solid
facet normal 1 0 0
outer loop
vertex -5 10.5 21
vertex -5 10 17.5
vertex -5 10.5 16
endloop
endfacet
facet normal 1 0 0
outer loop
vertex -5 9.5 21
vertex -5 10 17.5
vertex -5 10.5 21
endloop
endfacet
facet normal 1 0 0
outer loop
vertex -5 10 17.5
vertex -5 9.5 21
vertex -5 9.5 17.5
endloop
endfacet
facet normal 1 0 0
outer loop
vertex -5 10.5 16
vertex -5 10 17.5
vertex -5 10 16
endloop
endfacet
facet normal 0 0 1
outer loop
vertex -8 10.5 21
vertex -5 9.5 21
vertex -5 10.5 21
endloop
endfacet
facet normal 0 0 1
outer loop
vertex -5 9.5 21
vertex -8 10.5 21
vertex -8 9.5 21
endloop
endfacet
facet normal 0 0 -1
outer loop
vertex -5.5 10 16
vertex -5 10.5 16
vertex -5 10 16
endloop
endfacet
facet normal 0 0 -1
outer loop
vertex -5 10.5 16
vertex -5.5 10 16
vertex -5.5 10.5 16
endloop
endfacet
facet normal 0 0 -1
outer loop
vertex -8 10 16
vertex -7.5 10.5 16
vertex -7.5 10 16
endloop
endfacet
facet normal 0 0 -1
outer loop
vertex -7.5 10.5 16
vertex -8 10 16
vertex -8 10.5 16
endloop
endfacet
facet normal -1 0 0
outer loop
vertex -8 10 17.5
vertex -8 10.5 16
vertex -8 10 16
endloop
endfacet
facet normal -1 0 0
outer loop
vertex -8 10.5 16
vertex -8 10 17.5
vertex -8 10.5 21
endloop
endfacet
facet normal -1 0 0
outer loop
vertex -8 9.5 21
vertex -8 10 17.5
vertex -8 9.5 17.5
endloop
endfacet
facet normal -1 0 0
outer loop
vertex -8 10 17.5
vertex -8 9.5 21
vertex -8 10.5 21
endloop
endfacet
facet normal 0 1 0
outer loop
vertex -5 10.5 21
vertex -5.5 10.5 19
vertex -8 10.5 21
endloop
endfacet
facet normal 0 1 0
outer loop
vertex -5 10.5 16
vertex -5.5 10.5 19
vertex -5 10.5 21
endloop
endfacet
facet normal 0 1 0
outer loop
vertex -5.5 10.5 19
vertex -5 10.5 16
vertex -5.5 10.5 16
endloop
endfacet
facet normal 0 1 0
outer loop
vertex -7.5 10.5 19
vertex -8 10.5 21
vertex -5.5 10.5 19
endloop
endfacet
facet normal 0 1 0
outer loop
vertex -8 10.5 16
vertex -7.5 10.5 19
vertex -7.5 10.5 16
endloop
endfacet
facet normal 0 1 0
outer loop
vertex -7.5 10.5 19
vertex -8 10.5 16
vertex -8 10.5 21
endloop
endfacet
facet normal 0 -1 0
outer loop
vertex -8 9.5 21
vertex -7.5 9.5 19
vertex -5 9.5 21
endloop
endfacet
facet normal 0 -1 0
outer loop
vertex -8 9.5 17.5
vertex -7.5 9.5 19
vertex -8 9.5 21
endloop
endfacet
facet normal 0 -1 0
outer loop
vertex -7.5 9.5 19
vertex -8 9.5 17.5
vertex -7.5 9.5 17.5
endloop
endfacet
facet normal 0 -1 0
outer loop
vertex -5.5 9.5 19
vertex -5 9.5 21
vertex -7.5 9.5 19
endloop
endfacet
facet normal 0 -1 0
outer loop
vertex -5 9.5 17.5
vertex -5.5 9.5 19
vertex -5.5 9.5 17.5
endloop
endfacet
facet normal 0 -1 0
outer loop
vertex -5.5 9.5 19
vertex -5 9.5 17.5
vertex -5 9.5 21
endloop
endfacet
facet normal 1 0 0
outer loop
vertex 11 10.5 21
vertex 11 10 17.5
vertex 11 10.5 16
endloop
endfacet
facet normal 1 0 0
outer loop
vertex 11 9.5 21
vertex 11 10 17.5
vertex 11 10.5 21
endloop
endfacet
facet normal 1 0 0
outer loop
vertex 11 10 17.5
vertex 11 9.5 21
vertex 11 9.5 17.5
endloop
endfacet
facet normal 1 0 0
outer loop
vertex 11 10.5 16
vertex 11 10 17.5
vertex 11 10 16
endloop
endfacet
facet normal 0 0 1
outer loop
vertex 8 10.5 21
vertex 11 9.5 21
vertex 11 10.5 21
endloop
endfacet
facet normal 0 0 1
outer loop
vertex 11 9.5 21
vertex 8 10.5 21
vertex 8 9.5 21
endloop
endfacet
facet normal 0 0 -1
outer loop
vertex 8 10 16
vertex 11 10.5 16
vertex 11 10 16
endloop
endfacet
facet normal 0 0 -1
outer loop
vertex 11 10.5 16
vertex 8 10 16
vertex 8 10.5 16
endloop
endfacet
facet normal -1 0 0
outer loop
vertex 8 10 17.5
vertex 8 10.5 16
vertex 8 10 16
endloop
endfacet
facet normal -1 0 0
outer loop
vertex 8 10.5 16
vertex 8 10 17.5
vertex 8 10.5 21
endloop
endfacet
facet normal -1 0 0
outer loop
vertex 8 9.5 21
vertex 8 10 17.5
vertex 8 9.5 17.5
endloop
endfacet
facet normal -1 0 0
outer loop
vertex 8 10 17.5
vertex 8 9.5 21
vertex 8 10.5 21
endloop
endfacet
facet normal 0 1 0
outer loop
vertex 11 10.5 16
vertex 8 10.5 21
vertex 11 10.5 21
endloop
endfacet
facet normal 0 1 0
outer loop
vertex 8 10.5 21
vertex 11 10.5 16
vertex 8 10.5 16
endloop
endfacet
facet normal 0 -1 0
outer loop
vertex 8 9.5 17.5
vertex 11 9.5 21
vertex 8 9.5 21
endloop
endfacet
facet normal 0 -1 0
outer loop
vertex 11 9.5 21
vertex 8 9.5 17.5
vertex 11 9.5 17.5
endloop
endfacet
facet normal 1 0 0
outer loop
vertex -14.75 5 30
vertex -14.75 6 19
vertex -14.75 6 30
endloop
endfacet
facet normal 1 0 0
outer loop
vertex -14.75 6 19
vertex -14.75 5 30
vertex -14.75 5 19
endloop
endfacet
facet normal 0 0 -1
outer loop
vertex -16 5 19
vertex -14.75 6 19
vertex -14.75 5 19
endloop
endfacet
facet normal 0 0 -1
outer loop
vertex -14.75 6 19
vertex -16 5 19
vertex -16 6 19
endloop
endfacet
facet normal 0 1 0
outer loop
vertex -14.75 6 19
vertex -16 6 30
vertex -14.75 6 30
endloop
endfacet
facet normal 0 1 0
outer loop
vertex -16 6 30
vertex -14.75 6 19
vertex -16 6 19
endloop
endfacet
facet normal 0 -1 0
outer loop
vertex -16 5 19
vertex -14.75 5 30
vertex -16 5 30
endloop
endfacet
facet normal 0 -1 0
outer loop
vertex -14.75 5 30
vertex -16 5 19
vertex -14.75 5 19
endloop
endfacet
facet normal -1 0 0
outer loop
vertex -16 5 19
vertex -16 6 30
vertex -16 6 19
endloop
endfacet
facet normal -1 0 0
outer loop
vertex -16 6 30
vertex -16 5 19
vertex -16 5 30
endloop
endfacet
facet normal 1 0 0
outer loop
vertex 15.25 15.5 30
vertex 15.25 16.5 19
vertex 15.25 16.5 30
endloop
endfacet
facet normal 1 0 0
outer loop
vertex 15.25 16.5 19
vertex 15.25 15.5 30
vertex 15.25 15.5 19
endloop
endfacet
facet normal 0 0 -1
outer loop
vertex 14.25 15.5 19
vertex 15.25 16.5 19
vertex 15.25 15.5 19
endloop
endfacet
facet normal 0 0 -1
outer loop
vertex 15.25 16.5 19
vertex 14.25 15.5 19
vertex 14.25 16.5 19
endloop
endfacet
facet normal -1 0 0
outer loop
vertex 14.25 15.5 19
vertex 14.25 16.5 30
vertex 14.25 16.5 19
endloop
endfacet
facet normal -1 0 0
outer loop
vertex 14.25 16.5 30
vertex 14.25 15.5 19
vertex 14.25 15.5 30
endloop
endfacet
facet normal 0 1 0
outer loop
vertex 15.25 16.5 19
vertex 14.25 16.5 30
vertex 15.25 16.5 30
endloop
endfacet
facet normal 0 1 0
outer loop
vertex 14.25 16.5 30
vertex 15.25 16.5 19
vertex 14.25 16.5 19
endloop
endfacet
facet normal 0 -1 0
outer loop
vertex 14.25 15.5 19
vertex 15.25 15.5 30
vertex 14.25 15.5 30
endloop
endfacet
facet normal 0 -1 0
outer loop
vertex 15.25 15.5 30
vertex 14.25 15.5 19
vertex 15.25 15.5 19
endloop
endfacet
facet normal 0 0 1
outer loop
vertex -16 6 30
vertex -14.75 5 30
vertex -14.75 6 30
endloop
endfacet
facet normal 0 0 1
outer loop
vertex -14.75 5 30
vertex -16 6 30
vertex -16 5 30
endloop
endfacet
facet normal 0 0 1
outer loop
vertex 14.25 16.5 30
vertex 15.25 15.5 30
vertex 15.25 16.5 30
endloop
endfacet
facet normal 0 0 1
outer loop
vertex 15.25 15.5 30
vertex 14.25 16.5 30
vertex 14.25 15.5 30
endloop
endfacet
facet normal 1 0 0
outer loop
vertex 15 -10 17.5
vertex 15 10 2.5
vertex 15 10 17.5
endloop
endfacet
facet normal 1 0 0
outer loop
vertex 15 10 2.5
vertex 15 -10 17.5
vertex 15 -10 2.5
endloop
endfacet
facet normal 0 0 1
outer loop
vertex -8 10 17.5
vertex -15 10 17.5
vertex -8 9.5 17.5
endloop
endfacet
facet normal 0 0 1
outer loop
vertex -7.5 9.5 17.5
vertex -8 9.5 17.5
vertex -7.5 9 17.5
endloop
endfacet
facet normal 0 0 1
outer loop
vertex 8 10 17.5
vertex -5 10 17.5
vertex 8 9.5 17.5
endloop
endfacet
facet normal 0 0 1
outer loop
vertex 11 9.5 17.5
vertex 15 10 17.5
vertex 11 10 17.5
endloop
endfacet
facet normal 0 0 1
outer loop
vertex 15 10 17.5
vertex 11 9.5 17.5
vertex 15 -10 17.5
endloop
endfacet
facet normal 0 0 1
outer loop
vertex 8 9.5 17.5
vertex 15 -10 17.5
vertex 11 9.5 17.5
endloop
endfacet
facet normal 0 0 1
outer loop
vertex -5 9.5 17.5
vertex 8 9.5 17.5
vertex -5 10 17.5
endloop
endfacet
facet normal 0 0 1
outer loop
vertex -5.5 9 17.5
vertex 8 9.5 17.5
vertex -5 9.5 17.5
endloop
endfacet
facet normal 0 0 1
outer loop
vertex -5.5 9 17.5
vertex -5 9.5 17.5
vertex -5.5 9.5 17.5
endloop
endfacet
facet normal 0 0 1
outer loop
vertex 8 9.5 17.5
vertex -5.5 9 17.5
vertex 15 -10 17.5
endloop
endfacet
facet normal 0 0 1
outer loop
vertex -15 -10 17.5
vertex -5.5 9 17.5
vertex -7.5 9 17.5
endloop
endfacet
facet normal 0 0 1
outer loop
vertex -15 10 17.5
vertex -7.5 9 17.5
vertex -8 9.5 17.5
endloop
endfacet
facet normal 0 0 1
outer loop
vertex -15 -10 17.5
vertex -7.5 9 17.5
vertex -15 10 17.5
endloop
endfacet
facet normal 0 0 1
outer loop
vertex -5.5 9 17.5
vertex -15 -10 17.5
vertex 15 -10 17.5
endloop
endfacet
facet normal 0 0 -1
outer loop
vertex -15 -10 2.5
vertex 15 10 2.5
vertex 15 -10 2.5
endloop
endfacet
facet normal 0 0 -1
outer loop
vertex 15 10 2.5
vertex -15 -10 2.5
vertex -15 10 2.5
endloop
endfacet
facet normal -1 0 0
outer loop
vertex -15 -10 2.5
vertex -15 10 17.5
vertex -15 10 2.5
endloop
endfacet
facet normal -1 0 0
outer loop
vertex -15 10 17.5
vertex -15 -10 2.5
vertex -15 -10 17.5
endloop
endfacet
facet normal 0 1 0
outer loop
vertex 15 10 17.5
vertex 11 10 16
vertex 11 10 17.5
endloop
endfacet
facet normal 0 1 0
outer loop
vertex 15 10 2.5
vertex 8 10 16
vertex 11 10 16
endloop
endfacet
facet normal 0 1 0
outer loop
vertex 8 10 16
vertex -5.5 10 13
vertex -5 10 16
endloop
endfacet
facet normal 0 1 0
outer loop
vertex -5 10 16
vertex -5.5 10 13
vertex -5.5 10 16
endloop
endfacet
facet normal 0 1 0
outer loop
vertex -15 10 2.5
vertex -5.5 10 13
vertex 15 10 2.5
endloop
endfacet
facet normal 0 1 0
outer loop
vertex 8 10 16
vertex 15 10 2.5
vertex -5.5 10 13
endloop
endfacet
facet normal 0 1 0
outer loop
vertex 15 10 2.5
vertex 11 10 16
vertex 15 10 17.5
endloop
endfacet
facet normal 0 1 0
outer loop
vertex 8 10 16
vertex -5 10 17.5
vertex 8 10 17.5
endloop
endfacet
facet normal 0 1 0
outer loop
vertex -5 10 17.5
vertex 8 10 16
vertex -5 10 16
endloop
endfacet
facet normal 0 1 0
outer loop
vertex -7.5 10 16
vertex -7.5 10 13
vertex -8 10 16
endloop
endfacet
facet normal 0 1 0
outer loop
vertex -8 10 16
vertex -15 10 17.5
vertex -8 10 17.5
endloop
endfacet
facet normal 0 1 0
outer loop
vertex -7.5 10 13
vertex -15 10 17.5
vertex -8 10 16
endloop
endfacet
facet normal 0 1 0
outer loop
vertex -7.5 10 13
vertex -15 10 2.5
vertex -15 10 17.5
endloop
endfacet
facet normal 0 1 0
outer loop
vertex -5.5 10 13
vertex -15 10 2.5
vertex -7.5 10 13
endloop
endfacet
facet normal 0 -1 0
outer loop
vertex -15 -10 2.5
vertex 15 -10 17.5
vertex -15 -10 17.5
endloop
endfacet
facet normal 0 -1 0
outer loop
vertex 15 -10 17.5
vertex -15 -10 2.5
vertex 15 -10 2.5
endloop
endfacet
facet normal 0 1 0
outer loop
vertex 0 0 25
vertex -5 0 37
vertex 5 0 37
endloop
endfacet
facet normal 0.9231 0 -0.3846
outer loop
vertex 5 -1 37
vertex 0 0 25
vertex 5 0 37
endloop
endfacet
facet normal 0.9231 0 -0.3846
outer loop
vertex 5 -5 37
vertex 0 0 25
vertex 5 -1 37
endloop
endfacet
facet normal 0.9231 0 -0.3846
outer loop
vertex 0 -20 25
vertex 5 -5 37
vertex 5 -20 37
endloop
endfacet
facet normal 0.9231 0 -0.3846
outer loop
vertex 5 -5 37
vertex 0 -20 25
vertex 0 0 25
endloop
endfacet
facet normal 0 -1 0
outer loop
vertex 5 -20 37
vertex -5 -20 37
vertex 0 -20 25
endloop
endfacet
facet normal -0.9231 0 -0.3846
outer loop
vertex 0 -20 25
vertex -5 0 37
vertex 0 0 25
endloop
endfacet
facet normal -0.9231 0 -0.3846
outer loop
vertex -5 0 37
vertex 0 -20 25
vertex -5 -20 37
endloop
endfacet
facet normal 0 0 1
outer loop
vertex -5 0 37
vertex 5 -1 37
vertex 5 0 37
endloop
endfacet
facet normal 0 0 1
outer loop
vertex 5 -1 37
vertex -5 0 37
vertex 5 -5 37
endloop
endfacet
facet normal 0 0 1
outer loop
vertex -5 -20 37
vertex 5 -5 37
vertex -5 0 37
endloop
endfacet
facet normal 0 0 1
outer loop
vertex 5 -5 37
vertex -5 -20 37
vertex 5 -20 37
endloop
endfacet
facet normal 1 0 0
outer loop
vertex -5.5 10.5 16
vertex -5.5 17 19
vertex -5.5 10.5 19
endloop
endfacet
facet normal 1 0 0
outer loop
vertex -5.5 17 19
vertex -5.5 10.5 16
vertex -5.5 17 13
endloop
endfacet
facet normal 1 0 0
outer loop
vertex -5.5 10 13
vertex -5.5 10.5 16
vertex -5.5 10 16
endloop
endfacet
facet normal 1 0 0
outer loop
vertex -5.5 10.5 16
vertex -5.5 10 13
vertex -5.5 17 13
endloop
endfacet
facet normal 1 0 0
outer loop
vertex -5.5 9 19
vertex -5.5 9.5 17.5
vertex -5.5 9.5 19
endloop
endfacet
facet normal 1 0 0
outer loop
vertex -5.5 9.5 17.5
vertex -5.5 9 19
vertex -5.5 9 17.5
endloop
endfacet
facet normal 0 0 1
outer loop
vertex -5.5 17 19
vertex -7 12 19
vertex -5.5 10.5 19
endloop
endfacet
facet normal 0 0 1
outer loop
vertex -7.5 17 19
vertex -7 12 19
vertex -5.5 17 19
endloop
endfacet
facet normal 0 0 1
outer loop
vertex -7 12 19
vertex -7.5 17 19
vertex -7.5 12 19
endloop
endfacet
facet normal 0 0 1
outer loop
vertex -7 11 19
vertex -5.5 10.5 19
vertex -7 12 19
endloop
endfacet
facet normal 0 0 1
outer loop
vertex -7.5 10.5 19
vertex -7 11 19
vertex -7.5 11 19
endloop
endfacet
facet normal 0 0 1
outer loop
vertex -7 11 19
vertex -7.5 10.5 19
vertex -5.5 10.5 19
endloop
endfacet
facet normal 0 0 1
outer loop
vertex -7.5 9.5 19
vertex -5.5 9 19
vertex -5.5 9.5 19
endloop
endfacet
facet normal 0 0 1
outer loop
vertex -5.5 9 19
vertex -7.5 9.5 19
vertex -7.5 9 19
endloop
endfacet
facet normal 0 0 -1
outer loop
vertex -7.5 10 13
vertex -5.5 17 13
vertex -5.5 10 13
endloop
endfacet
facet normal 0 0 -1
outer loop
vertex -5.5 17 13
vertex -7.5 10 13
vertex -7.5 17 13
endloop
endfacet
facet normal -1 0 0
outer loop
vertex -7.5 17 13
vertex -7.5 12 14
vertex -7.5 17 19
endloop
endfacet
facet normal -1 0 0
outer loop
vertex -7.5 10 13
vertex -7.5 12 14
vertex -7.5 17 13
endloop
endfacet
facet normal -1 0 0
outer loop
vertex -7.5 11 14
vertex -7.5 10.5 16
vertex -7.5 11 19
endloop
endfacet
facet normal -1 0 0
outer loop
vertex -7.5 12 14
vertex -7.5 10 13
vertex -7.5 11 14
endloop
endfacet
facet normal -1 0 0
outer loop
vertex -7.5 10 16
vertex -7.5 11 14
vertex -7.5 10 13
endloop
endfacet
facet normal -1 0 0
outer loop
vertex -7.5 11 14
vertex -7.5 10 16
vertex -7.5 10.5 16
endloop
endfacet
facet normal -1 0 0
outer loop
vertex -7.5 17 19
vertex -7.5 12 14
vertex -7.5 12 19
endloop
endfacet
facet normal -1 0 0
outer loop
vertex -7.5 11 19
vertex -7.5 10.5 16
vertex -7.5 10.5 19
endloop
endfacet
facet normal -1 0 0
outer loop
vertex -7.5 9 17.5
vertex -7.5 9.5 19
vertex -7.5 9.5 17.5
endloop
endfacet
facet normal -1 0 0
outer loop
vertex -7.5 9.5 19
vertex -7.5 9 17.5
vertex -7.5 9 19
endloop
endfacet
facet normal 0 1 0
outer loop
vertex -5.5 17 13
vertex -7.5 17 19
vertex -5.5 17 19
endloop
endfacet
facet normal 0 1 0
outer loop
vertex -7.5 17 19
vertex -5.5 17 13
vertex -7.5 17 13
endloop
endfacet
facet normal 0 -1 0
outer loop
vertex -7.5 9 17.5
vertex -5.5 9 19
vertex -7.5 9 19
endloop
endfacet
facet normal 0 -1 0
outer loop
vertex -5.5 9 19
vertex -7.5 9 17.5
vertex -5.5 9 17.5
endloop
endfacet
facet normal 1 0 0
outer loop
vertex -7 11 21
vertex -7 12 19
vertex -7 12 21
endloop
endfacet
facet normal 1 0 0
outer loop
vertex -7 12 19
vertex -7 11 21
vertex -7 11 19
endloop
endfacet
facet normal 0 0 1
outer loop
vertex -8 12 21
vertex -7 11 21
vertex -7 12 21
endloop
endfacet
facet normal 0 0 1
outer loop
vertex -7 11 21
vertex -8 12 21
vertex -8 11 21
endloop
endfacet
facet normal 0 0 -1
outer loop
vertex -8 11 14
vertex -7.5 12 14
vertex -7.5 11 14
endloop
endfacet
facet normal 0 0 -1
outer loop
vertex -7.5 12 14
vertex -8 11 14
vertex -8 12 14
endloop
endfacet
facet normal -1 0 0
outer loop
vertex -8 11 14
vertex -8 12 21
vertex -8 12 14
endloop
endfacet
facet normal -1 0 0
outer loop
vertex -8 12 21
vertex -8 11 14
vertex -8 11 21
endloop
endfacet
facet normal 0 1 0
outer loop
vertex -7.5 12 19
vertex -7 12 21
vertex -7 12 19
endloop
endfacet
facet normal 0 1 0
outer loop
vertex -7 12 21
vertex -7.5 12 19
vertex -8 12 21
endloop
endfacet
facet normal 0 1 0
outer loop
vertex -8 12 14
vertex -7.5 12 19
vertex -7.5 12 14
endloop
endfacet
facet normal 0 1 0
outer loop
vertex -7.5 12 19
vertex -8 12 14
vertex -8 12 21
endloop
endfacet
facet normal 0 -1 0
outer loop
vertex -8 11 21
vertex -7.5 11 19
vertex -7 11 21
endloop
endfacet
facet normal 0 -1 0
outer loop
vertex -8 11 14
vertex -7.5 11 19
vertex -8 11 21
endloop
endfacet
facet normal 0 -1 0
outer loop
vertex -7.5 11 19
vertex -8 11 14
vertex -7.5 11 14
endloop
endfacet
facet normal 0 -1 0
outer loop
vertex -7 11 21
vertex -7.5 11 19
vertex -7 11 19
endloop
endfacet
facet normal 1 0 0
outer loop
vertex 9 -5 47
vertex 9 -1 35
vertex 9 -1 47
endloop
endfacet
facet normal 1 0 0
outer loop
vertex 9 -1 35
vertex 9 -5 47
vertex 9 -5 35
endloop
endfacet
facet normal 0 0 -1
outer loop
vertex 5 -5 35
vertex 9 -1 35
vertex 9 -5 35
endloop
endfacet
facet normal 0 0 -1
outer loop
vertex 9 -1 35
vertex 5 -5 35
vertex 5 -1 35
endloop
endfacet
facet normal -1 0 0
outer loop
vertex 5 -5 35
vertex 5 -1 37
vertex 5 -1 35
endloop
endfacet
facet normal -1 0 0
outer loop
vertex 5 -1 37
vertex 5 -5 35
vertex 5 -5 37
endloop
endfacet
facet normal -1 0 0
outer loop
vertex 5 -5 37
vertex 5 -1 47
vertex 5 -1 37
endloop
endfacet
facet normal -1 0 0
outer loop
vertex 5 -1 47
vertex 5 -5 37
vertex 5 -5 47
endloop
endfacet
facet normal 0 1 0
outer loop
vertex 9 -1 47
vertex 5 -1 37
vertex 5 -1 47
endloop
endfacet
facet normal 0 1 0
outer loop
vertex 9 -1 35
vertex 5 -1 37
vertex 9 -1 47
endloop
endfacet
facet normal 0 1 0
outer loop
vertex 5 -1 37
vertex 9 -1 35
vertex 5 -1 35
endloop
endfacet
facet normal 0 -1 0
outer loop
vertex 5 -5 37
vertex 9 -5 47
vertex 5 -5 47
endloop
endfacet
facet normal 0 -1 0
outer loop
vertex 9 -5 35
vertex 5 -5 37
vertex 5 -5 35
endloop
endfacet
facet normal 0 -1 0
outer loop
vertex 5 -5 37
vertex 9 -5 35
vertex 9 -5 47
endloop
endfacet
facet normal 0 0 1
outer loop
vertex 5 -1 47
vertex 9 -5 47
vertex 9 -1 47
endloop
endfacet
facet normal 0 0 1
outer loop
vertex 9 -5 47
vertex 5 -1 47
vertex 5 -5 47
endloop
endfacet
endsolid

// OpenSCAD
// Generated by CadMonkey
// Prompt: hey cadmonkey, create me a house
// Generated at: 2025-11-12 00:34:57

// House model using OpenSCAD primitives
$fn = 50;

module house() {
    // Main building base
    color("tan") 
    translate([0, 0, 10])
        cube([30, 20, 15], center=true);
    
    // Roof - gable style
    color("red")
    translate([0, 0, 25])
        rotate([90, 0, 0])
            linear_extrude(20)
                polygon([[0, 0], [5, 12], [-5, 12]]);
    
    // Front door
    color("brown")
    translate([-7.5, 9, 13])
        cube([2, 8, 6]);
    
    // Door frame
    color("brown")
    translate([-8, 11, 14])
        cube([1, 1, 7]);
    
    // Windows - front
    for(x = [-8, 8]) {
        color("lightblue")
        translate([x, 9.5, 16])
            cube([3, 1, 5]);
        
        // Window frames
        color("white")
        translate([x+0.5, 9.5, 17])
            cube([2, 1, 3]);
    }
    
    // Windows - sides
    for(z = [19, 22, 24, 27]) {
        for(y = [5, 15]) {
            if(y < 15) { // Left side windows
                color("lightblue")
                translate([-15.75, y, z])
                    cube([1, 1, 3]);
                
                // Side window frame
                color("white")
                translate([-16, y, z])
                    cube([0.5, 1, 3]);
            } else { // Right side windows
                // Back wall windows
                color("lightblue")
                translate([y-0.75, 15.5, z])
                    cube([1, 1, 3]);
                
                // Back wall frame
                color("white")
                translate([y-0.5, 15.5, z])
                    cube([0.5, 1, 3]);
            }
        }
    }
    
    // Chimney
    color("gray")
    translate([5, -5, 35])
        cube([4, 4, 10]);
    
    // Chimney top
    color("darkgray")
    translate([5, -5, 45])
        cube([4, 4, 2]);
}

house();
